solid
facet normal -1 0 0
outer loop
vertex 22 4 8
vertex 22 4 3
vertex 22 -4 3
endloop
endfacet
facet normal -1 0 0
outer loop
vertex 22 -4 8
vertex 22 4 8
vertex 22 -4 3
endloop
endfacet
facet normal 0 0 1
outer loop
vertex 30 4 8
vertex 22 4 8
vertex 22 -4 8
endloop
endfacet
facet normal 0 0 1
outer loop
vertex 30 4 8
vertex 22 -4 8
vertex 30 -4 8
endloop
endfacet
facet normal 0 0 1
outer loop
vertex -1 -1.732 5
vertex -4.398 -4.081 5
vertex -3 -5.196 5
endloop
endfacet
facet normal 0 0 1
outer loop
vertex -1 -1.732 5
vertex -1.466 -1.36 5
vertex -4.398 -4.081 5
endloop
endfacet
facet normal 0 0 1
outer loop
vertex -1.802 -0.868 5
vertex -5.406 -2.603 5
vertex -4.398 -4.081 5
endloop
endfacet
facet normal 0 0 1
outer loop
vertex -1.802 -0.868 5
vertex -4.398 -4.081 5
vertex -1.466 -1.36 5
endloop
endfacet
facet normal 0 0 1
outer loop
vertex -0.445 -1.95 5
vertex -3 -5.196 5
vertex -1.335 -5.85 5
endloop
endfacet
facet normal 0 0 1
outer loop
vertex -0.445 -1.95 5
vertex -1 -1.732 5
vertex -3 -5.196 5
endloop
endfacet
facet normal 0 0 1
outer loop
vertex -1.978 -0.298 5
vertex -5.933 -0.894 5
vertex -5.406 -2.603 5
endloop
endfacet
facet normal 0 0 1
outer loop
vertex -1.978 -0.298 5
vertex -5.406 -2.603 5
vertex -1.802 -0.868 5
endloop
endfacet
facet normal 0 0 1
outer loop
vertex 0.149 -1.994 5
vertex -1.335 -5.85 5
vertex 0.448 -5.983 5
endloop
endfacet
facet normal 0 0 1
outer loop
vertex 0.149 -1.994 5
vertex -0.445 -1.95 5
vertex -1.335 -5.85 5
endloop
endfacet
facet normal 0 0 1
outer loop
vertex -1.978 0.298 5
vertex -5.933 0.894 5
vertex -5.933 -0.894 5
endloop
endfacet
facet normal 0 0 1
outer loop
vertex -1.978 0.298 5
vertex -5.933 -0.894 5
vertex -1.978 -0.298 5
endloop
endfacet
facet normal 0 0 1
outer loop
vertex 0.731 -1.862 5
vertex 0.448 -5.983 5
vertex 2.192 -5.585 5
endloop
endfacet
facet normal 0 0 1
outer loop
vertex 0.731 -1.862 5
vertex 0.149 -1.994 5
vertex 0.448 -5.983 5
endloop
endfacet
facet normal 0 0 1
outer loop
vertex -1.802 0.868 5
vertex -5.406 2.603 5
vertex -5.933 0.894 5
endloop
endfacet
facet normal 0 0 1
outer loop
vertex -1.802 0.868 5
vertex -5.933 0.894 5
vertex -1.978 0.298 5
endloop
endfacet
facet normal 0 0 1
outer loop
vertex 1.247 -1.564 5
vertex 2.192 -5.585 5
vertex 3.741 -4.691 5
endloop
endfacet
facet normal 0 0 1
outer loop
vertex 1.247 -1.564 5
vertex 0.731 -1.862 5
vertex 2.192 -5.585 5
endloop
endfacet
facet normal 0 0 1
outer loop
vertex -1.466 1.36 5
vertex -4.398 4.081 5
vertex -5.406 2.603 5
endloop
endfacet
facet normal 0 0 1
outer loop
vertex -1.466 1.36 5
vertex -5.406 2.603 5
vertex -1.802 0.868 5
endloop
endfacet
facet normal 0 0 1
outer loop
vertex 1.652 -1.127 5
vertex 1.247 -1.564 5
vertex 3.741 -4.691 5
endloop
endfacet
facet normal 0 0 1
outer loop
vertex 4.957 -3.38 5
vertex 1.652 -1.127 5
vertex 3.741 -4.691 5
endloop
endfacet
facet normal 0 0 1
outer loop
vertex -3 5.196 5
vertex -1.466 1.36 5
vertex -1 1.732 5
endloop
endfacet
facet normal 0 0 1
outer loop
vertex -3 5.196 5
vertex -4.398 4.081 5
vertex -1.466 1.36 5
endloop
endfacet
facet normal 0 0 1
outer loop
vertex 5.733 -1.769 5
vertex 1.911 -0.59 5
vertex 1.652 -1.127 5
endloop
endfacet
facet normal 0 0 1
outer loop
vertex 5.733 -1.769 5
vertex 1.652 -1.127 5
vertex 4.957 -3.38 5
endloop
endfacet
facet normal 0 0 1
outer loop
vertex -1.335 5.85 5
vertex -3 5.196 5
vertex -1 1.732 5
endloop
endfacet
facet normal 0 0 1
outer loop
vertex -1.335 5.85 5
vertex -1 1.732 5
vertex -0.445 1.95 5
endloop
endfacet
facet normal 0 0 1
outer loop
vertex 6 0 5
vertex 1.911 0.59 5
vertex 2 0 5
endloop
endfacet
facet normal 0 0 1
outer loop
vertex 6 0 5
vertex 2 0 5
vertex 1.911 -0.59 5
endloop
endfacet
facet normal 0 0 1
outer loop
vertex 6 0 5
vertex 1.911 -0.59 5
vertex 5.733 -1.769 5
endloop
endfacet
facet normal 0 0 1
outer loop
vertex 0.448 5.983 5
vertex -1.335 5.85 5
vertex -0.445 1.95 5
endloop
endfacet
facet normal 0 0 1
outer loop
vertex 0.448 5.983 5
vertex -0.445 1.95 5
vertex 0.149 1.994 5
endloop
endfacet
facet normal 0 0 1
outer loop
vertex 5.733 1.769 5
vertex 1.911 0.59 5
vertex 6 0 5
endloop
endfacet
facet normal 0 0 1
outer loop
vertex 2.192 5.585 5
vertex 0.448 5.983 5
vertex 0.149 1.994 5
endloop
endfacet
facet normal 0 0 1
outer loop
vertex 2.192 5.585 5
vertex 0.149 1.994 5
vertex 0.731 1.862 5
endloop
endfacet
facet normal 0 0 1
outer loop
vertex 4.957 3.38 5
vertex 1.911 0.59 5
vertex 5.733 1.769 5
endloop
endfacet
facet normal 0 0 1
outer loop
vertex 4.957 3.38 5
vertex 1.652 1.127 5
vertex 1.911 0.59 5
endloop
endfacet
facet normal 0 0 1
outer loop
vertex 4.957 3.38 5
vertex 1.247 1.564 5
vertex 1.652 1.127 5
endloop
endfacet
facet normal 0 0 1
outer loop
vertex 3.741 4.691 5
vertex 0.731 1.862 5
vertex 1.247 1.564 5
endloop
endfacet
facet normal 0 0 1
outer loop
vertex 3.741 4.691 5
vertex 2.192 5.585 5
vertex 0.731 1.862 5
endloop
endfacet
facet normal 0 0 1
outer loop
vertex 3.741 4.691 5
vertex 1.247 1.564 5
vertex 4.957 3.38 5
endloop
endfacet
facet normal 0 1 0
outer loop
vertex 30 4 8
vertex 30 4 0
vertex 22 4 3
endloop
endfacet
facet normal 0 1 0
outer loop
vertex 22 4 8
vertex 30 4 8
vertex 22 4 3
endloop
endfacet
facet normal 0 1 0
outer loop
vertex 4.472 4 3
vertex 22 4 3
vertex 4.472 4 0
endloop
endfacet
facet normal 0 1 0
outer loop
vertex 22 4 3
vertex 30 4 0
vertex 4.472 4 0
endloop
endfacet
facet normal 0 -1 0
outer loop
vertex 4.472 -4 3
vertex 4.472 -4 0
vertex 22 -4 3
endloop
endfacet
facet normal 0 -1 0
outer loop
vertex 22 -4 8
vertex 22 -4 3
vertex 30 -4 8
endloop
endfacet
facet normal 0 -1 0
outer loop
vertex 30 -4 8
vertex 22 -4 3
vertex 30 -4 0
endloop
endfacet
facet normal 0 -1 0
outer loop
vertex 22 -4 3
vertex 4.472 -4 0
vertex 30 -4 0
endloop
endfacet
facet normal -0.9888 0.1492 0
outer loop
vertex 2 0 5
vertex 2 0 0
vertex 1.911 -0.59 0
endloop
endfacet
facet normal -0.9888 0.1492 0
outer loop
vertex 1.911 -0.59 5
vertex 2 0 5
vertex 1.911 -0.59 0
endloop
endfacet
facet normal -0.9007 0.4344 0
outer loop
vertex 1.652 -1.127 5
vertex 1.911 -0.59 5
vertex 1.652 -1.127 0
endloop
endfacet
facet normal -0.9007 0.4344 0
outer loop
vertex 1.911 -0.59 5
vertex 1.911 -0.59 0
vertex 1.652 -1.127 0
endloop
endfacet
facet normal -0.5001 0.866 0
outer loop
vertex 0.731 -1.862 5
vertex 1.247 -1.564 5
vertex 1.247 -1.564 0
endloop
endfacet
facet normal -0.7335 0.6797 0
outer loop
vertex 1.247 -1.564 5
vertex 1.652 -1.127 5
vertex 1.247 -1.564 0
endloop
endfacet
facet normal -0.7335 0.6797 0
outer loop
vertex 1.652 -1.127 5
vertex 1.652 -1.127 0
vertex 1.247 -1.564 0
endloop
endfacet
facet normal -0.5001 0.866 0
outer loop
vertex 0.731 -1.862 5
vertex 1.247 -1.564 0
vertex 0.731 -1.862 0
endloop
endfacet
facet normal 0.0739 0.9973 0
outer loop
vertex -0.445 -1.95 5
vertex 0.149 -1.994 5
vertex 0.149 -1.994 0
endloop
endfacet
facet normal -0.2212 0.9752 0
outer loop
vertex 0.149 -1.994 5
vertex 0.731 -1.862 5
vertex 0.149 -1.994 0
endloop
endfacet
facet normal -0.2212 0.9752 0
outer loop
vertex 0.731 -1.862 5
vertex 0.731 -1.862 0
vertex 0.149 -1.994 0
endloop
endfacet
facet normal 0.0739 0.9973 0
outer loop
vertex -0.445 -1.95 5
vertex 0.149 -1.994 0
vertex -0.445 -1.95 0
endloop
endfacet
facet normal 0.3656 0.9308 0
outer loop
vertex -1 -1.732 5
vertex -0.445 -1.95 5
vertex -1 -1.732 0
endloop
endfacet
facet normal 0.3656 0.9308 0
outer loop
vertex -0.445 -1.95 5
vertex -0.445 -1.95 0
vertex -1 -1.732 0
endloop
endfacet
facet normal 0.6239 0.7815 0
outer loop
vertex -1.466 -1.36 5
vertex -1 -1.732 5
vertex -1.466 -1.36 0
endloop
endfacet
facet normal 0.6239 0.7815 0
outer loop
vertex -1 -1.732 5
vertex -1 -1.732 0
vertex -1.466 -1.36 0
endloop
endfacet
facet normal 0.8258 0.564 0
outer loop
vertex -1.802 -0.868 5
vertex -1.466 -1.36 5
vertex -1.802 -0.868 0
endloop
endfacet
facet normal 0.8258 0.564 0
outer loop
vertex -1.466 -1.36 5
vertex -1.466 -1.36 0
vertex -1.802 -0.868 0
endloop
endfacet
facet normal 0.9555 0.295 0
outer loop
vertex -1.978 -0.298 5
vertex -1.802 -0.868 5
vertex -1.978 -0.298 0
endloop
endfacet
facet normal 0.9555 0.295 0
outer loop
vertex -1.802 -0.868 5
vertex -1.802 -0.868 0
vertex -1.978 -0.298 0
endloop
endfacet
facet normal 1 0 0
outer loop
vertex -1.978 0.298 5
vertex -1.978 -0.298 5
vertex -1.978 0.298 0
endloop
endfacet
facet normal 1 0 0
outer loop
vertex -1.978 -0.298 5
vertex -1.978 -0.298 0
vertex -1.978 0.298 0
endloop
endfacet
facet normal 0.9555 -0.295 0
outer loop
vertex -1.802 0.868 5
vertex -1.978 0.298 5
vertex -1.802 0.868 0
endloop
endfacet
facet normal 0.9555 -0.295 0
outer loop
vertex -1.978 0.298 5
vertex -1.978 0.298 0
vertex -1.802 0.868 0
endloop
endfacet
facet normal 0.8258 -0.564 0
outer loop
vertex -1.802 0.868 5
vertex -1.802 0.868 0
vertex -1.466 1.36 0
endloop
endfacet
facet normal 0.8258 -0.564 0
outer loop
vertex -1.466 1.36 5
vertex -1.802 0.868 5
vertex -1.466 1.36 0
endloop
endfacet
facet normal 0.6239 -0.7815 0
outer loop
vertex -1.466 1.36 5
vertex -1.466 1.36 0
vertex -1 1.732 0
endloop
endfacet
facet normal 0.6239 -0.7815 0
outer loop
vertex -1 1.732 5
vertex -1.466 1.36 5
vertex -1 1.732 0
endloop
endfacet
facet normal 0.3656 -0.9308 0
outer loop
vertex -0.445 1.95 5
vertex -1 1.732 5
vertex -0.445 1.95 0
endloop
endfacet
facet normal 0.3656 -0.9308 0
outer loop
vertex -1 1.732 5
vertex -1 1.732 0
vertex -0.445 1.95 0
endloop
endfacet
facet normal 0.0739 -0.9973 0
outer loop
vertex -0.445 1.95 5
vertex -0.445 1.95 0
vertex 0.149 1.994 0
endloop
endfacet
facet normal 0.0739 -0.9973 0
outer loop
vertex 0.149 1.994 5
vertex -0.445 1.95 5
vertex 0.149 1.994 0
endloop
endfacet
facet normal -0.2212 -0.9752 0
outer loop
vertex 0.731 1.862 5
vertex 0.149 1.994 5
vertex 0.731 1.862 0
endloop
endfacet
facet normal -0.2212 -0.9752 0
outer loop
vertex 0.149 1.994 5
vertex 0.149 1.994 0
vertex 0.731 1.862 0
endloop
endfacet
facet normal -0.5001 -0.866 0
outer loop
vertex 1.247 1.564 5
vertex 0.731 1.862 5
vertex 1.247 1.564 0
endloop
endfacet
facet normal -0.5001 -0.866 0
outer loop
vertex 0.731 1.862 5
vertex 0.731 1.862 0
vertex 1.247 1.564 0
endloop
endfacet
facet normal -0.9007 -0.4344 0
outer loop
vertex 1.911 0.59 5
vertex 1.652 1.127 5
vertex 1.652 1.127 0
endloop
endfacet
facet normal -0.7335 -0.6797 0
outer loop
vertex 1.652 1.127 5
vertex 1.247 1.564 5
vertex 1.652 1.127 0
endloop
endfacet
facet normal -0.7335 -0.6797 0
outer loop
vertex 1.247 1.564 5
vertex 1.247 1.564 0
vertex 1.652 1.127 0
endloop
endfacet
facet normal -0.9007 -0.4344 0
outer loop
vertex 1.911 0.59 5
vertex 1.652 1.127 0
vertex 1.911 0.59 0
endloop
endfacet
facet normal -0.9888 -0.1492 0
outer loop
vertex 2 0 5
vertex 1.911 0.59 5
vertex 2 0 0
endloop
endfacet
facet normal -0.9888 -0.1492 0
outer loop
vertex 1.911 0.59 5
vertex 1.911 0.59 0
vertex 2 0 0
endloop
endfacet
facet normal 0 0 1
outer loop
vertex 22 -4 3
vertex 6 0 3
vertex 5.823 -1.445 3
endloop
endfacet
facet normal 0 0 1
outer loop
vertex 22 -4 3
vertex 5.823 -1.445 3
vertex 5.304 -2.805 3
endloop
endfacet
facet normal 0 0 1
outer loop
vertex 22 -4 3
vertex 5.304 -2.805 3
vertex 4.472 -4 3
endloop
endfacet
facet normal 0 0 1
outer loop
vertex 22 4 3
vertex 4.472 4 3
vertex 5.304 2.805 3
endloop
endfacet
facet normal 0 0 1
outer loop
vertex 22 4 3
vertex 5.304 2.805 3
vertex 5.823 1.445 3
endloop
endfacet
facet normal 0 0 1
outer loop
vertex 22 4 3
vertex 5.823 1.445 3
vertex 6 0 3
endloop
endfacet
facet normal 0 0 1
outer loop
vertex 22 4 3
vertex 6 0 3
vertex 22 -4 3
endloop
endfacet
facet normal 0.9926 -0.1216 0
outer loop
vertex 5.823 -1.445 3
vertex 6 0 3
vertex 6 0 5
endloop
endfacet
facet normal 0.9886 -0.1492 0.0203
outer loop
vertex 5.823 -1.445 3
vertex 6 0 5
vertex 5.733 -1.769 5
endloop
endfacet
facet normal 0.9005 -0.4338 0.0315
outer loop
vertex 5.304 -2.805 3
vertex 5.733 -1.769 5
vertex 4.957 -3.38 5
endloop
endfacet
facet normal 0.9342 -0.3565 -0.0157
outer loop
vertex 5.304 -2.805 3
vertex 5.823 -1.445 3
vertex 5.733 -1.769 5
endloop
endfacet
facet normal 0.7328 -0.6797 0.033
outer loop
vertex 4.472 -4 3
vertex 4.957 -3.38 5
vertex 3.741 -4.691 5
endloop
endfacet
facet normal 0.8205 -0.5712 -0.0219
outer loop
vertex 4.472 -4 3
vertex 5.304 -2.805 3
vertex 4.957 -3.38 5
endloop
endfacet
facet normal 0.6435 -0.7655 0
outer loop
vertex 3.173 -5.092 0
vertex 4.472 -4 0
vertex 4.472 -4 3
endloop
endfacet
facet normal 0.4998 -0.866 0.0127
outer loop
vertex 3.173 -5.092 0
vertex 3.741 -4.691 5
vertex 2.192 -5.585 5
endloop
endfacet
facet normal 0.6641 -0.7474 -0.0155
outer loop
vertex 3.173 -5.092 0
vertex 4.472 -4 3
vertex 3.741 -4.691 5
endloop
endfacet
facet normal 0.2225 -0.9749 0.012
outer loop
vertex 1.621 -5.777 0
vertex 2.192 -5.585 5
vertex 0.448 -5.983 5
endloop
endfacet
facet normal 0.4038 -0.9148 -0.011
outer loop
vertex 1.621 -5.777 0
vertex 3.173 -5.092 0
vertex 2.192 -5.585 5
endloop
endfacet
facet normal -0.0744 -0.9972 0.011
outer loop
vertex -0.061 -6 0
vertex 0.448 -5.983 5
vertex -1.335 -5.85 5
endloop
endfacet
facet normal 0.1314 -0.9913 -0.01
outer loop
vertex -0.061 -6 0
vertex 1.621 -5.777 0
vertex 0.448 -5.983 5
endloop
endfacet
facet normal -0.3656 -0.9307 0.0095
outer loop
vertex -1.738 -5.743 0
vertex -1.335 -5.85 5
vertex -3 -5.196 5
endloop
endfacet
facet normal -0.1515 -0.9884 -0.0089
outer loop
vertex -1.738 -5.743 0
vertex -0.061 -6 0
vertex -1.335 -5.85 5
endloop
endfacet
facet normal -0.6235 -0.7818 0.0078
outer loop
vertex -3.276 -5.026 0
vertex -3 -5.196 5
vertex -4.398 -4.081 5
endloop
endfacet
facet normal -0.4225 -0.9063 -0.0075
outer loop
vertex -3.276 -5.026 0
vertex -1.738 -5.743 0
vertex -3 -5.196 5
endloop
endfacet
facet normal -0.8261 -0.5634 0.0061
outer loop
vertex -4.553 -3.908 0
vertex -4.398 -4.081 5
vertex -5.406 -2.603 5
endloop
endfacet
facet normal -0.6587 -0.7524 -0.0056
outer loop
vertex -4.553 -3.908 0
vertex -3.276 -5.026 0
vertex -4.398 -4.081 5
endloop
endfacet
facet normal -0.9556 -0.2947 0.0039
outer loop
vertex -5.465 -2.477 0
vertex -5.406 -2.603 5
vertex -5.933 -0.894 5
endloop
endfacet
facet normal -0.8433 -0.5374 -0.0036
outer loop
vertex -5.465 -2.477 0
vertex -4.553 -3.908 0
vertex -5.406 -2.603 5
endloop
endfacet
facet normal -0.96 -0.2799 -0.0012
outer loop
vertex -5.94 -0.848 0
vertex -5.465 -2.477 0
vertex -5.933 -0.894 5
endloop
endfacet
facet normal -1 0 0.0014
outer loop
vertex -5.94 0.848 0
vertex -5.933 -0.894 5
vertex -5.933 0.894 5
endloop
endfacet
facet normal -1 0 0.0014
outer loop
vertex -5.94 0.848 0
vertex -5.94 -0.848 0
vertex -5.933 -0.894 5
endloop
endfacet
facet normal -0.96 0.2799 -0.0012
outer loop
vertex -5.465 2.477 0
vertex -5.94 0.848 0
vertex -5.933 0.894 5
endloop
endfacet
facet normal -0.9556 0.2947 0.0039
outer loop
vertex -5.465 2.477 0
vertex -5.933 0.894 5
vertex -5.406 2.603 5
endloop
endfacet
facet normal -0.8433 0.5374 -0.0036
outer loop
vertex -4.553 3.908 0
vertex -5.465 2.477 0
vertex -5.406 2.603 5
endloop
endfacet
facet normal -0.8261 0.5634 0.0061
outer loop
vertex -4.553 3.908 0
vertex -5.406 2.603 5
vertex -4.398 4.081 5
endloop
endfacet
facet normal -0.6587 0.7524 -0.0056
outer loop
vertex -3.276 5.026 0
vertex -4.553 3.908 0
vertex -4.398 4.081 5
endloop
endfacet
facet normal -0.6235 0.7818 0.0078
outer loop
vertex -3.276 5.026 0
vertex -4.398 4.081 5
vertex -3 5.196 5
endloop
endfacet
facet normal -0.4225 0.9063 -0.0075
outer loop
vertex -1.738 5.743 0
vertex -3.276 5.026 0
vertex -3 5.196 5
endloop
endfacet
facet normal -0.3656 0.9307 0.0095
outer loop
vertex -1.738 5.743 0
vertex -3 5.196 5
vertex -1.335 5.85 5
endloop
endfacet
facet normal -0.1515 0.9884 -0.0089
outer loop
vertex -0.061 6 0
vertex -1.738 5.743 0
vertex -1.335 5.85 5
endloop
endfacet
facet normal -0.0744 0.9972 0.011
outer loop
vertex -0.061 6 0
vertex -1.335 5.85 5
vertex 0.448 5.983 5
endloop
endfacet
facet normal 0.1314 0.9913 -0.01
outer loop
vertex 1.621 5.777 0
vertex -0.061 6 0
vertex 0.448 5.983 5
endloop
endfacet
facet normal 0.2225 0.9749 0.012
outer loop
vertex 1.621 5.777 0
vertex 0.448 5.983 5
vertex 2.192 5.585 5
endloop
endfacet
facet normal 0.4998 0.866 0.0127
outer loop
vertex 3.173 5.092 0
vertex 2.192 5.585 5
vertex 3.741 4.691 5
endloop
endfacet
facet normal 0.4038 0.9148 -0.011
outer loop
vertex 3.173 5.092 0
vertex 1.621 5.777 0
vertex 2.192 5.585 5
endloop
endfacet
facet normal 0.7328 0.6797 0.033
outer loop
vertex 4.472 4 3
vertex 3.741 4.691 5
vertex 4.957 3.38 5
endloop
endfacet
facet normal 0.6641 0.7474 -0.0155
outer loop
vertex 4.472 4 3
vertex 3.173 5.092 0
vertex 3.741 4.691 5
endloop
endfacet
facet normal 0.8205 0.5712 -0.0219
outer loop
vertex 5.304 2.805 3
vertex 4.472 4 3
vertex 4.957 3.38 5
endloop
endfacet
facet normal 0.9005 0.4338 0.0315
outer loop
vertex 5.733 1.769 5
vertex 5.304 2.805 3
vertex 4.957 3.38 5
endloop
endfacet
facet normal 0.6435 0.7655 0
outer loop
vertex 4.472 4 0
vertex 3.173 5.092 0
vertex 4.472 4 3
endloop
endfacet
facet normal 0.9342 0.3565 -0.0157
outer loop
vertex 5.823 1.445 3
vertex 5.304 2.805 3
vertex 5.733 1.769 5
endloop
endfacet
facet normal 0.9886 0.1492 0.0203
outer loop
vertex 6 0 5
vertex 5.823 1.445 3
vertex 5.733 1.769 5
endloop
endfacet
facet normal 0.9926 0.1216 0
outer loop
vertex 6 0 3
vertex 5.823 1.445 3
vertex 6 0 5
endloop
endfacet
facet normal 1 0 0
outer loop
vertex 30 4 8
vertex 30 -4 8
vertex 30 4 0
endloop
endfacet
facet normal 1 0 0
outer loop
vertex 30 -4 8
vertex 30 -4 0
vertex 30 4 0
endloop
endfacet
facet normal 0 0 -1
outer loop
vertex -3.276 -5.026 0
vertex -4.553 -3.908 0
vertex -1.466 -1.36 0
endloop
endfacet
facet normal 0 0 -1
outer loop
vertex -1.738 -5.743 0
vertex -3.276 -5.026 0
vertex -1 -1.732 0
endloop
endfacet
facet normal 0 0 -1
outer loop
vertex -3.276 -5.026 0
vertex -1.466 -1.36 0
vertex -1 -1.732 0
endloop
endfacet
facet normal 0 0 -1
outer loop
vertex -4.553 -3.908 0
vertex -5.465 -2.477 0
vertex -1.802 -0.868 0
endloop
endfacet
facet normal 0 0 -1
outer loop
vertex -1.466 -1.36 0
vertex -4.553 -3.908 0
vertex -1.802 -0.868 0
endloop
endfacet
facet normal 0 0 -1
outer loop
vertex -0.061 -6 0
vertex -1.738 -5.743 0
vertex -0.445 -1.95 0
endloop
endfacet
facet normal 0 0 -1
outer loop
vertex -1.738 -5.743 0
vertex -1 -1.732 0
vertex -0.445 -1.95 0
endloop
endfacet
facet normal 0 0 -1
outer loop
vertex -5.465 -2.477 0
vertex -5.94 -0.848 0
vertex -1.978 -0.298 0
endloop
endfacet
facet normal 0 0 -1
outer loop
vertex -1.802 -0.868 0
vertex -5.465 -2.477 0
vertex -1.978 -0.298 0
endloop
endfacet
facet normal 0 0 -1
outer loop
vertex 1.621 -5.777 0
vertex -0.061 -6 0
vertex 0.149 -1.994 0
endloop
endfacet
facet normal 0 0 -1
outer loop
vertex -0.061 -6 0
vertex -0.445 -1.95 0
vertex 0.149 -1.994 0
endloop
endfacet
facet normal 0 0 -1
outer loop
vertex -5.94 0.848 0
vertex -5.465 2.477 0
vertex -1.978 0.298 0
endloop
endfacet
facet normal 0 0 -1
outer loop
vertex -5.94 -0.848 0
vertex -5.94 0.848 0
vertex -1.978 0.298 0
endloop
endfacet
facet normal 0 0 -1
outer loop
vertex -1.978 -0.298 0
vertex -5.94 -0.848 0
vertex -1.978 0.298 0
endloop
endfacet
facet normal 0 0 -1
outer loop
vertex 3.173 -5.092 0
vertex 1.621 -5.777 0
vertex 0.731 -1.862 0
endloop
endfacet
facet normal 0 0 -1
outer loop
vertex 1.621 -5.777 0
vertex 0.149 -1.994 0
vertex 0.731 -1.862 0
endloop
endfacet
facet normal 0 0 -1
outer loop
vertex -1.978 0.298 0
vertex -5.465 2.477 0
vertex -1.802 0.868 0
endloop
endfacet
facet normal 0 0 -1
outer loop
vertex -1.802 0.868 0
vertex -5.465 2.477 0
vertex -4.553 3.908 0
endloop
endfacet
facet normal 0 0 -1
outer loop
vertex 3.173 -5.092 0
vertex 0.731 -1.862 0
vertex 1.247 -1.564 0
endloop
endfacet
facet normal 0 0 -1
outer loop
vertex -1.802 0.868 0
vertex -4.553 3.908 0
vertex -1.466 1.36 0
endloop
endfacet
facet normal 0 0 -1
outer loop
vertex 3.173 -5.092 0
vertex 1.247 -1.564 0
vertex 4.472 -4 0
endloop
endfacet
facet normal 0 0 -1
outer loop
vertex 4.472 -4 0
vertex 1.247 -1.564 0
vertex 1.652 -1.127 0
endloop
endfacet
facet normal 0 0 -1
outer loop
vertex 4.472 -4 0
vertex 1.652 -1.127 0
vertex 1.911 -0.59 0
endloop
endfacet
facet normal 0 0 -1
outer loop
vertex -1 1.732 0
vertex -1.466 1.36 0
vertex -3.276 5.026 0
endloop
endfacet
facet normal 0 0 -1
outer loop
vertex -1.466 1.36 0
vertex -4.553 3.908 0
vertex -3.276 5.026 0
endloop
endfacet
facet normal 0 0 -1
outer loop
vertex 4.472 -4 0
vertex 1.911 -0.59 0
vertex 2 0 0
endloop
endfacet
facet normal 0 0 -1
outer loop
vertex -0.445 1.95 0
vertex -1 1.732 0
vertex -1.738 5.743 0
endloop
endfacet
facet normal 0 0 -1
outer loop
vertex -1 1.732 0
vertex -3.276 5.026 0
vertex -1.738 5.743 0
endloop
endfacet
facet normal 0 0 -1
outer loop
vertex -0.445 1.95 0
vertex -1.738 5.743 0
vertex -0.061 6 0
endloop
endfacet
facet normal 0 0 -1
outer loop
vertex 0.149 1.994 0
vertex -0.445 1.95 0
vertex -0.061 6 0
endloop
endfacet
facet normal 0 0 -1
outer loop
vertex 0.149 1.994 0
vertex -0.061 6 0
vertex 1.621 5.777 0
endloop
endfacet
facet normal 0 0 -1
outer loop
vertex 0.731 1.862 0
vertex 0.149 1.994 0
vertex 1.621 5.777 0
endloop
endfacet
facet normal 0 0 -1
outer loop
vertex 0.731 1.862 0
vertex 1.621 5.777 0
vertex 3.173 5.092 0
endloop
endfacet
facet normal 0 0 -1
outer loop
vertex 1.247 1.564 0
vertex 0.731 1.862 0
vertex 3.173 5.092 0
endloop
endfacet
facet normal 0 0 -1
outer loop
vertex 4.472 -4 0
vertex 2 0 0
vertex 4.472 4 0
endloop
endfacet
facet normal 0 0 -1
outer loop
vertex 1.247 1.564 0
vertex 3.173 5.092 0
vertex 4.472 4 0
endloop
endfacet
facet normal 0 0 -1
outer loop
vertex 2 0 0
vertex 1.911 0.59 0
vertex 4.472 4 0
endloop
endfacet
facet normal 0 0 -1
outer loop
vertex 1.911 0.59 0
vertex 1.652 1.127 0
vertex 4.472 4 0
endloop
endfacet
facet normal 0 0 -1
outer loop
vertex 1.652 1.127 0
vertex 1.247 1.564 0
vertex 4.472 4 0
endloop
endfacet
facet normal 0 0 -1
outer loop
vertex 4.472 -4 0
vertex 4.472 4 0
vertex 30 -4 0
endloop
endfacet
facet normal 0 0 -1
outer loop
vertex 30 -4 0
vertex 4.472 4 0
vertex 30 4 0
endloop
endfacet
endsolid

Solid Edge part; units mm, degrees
sketch "Sketch1" plane through (0, 0, 0) normal (0, 0, 1) x (1, 0, 0)
  circle A0 centre (0, 0) radius 6
  circle A1 centre (0, 0) radius 2
  dimension "D1" = 4
  dimension "D2" = 12
extrude "Protrusion1" add sketch "Sketch1" along normal blind 5
sketch "Sketch2" plane through (0, 0, 0) normal (0, 0, -1) x (0, 1, 0)
  line L0 (4, 4.4721) -> (-4, 4.4721)
  line L1 (-4, 4.4721) -> (-4, 30)
  line L2 (-4, 30) -> (4, 30)
  line L3 (4, 30) -> (4, 4.4721)
  dimension "D1" = 8
  dimension "D2" = 30
extrude "ExtrudedProtrusion_2" add sketch "Sketch2" against normal blind 3
sketch "Sketch3" plane through (14.7361, 0, 3) normal (0, 0, 1) x (1, 0, 0)
  line L0 (15.2639, 4) -> (7.2639, 4)
  line L1 (7.2639, 4) -> (7.2639, -4)
  line L2 (7.2639, -4) -> (15.2639, -4)
  line L3 (15.2639, -4) -> (15.2639, 4)
  dimension "D1" = 8
extrude "ExtrudedProtrusion_3" add sketch "Sketch3" along normal blind 5
properties material "Polyethylene, low density"
